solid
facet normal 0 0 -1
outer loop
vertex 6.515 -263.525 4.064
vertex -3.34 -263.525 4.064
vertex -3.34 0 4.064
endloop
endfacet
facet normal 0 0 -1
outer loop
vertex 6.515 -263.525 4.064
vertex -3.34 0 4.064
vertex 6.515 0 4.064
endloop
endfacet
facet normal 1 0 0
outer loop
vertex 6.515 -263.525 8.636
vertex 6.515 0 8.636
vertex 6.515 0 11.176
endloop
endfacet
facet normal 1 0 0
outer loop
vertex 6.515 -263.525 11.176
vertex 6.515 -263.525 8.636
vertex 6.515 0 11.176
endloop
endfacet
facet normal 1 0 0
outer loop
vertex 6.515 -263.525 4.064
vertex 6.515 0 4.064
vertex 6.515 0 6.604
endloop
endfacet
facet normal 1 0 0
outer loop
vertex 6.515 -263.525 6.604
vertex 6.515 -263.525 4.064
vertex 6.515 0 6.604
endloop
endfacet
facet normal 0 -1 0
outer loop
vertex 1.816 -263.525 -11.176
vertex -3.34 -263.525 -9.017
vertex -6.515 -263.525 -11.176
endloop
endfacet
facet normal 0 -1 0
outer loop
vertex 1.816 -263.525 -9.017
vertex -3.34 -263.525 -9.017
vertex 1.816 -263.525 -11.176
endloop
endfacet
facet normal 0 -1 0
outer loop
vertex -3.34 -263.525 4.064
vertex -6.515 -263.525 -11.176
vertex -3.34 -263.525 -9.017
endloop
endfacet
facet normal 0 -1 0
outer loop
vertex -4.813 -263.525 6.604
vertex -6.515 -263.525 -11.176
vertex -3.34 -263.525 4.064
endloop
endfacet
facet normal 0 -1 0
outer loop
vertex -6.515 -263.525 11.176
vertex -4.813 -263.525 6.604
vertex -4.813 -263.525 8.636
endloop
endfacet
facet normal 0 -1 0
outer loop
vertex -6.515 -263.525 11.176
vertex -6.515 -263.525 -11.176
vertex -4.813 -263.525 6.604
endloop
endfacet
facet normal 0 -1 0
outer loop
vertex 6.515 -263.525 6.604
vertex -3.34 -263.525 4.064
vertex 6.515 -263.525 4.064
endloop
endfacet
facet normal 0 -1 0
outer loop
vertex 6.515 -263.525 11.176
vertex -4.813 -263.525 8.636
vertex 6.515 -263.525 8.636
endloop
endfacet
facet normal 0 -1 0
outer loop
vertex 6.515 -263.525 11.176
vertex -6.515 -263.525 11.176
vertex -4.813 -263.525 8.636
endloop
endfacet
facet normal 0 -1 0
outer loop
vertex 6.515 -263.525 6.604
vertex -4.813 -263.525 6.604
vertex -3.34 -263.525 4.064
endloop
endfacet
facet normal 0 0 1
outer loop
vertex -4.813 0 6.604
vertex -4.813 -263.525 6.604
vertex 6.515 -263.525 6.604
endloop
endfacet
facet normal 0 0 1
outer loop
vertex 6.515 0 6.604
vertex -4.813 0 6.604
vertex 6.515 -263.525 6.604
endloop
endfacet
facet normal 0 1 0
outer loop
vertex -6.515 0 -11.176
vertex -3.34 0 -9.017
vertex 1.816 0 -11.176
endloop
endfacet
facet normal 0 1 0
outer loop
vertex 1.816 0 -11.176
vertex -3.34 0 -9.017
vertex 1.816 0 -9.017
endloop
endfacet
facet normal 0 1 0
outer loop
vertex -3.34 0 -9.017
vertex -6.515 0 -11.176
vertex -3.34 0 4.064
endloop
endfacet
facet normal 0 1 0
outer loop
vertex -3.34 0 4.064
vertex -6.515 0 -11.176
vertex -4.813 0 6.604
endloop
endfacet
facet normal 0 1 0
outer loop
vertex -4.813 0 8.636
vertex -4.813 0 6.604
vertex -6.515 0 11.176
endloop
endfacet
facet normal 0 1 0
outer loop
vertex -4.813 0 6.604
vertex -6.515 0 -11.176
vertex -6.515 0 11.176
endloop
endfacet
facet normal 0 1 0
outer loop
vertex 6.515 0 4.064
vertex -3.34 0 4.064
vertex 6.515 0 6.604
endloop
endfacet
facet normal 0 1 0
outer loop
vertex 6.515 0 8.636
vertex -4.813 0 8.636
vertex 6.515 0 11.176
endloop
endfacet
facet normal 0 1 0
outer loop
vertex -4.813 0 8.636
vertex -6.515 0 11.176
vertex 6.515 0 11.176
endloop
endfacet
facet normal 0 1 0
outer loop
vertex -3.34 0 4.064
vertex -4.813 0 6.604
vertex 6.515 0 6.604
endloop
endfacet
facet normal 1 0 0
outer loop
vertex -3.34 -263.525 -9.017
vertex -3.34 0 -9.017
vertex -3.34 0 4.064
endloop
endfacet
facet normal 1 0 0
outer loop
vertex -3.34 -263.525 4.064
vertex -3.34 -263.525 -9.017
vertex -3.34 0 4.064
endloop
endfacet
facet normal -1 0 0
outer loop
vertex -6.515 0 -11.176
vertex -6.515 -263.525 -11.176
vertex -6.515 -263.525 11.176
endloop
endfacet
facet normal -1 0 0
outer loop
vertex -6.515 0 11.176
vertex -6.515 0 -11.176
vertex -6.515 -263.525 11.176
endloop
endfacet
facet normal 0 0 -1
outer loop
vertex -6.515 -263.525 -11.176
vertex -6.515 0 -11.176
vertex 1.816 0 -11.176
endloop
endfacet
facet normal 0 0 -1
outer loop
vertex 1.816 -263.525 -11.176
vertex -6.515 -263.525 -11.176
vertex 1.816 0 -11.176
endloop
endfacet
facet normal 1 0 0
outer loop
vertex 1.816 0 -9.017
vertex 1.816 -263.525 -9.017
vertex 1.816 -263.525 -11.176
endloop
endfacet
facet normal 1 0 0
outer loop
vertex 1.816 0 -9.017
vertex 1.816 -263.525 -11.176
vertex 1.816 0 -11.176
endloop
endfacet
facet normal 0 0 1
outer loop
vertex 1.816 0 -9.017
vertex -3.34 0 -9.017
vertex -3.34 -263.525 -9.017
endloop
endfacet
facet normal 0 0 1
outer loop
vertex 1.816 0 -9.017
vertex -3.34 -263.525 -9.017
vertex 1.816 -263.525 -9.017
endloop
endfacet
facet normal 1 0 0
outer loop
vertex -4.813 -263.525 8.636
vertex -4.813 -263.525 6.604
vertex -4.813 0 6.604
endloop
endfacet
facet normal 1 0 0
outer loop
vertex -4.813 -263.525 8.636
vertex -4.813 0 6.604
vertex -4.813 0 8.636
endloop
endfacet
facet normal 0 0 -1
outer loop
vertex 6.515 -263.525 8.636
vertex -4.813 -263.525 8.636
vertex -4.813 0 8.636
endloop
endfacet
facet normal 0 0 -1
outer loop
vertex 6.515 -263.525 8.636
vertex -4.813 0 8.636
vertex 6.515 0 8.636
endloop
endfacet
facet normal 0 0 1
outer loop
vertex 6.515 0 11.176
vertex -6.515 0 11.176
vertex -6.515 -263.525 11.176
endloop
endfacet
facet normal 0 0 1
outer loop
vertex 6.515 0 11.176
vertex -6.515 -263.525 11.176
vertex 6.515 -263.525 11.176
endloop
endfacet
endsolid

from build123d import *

# Parameters (mm, degrees)
F0_W     = 13.0302
F0_H     = 22.352
F1_DEPTH = 263.525
F2_W     = 11.3284
F2_H     = 2.032
F3_DEPTH = 263.526
F4_W     = 9.8552
F4_H     = 13.081
F5_DEPTH = 263.526
F6_W     = 263.525
F6_H     = 2.159
F7_DEPTH = 4.699


with BuildPart() as f1:
    # F0 (on Front) → F1 (new body)
    with BuildSketch(Plane.XZ):
        Rectangle(F0_W, F0_H)
    extrude(amount=F1_DEPTH)

    # F2 (on face) → F3 (cut, through all)
    with BuildSketch(Plane.XZ.offset(263.525)):
        with Locations((0.8509, 7.62)):
            Rectangle(F2_W, F2_H)
    extrude(amount=-F3_DEPTH, mode=Mode.SUBTRACT)

    # F4 (on face) → F5 (cut, through all)
    with BuildSketch(Plane.XZ.offset(263.525)):
        with Locations((1.5875, -2.4765)):
            Rectangle(F4_W, F4_H)
    extrude(amount=-F5_DEPTH, mode=Mode.SUBTRACT)

    # F6 (on face) → F7 (cut)
    with BuildSketch(Plane.YZ.offset(6.5151)):
        with Locations((-131.7625, -10.0965)):
            Rectangle(F6_W, F6_H)
    extrude(amount=-F7_DEPTH, mode=Mode.SUBTRACT)


solid = f1.part
